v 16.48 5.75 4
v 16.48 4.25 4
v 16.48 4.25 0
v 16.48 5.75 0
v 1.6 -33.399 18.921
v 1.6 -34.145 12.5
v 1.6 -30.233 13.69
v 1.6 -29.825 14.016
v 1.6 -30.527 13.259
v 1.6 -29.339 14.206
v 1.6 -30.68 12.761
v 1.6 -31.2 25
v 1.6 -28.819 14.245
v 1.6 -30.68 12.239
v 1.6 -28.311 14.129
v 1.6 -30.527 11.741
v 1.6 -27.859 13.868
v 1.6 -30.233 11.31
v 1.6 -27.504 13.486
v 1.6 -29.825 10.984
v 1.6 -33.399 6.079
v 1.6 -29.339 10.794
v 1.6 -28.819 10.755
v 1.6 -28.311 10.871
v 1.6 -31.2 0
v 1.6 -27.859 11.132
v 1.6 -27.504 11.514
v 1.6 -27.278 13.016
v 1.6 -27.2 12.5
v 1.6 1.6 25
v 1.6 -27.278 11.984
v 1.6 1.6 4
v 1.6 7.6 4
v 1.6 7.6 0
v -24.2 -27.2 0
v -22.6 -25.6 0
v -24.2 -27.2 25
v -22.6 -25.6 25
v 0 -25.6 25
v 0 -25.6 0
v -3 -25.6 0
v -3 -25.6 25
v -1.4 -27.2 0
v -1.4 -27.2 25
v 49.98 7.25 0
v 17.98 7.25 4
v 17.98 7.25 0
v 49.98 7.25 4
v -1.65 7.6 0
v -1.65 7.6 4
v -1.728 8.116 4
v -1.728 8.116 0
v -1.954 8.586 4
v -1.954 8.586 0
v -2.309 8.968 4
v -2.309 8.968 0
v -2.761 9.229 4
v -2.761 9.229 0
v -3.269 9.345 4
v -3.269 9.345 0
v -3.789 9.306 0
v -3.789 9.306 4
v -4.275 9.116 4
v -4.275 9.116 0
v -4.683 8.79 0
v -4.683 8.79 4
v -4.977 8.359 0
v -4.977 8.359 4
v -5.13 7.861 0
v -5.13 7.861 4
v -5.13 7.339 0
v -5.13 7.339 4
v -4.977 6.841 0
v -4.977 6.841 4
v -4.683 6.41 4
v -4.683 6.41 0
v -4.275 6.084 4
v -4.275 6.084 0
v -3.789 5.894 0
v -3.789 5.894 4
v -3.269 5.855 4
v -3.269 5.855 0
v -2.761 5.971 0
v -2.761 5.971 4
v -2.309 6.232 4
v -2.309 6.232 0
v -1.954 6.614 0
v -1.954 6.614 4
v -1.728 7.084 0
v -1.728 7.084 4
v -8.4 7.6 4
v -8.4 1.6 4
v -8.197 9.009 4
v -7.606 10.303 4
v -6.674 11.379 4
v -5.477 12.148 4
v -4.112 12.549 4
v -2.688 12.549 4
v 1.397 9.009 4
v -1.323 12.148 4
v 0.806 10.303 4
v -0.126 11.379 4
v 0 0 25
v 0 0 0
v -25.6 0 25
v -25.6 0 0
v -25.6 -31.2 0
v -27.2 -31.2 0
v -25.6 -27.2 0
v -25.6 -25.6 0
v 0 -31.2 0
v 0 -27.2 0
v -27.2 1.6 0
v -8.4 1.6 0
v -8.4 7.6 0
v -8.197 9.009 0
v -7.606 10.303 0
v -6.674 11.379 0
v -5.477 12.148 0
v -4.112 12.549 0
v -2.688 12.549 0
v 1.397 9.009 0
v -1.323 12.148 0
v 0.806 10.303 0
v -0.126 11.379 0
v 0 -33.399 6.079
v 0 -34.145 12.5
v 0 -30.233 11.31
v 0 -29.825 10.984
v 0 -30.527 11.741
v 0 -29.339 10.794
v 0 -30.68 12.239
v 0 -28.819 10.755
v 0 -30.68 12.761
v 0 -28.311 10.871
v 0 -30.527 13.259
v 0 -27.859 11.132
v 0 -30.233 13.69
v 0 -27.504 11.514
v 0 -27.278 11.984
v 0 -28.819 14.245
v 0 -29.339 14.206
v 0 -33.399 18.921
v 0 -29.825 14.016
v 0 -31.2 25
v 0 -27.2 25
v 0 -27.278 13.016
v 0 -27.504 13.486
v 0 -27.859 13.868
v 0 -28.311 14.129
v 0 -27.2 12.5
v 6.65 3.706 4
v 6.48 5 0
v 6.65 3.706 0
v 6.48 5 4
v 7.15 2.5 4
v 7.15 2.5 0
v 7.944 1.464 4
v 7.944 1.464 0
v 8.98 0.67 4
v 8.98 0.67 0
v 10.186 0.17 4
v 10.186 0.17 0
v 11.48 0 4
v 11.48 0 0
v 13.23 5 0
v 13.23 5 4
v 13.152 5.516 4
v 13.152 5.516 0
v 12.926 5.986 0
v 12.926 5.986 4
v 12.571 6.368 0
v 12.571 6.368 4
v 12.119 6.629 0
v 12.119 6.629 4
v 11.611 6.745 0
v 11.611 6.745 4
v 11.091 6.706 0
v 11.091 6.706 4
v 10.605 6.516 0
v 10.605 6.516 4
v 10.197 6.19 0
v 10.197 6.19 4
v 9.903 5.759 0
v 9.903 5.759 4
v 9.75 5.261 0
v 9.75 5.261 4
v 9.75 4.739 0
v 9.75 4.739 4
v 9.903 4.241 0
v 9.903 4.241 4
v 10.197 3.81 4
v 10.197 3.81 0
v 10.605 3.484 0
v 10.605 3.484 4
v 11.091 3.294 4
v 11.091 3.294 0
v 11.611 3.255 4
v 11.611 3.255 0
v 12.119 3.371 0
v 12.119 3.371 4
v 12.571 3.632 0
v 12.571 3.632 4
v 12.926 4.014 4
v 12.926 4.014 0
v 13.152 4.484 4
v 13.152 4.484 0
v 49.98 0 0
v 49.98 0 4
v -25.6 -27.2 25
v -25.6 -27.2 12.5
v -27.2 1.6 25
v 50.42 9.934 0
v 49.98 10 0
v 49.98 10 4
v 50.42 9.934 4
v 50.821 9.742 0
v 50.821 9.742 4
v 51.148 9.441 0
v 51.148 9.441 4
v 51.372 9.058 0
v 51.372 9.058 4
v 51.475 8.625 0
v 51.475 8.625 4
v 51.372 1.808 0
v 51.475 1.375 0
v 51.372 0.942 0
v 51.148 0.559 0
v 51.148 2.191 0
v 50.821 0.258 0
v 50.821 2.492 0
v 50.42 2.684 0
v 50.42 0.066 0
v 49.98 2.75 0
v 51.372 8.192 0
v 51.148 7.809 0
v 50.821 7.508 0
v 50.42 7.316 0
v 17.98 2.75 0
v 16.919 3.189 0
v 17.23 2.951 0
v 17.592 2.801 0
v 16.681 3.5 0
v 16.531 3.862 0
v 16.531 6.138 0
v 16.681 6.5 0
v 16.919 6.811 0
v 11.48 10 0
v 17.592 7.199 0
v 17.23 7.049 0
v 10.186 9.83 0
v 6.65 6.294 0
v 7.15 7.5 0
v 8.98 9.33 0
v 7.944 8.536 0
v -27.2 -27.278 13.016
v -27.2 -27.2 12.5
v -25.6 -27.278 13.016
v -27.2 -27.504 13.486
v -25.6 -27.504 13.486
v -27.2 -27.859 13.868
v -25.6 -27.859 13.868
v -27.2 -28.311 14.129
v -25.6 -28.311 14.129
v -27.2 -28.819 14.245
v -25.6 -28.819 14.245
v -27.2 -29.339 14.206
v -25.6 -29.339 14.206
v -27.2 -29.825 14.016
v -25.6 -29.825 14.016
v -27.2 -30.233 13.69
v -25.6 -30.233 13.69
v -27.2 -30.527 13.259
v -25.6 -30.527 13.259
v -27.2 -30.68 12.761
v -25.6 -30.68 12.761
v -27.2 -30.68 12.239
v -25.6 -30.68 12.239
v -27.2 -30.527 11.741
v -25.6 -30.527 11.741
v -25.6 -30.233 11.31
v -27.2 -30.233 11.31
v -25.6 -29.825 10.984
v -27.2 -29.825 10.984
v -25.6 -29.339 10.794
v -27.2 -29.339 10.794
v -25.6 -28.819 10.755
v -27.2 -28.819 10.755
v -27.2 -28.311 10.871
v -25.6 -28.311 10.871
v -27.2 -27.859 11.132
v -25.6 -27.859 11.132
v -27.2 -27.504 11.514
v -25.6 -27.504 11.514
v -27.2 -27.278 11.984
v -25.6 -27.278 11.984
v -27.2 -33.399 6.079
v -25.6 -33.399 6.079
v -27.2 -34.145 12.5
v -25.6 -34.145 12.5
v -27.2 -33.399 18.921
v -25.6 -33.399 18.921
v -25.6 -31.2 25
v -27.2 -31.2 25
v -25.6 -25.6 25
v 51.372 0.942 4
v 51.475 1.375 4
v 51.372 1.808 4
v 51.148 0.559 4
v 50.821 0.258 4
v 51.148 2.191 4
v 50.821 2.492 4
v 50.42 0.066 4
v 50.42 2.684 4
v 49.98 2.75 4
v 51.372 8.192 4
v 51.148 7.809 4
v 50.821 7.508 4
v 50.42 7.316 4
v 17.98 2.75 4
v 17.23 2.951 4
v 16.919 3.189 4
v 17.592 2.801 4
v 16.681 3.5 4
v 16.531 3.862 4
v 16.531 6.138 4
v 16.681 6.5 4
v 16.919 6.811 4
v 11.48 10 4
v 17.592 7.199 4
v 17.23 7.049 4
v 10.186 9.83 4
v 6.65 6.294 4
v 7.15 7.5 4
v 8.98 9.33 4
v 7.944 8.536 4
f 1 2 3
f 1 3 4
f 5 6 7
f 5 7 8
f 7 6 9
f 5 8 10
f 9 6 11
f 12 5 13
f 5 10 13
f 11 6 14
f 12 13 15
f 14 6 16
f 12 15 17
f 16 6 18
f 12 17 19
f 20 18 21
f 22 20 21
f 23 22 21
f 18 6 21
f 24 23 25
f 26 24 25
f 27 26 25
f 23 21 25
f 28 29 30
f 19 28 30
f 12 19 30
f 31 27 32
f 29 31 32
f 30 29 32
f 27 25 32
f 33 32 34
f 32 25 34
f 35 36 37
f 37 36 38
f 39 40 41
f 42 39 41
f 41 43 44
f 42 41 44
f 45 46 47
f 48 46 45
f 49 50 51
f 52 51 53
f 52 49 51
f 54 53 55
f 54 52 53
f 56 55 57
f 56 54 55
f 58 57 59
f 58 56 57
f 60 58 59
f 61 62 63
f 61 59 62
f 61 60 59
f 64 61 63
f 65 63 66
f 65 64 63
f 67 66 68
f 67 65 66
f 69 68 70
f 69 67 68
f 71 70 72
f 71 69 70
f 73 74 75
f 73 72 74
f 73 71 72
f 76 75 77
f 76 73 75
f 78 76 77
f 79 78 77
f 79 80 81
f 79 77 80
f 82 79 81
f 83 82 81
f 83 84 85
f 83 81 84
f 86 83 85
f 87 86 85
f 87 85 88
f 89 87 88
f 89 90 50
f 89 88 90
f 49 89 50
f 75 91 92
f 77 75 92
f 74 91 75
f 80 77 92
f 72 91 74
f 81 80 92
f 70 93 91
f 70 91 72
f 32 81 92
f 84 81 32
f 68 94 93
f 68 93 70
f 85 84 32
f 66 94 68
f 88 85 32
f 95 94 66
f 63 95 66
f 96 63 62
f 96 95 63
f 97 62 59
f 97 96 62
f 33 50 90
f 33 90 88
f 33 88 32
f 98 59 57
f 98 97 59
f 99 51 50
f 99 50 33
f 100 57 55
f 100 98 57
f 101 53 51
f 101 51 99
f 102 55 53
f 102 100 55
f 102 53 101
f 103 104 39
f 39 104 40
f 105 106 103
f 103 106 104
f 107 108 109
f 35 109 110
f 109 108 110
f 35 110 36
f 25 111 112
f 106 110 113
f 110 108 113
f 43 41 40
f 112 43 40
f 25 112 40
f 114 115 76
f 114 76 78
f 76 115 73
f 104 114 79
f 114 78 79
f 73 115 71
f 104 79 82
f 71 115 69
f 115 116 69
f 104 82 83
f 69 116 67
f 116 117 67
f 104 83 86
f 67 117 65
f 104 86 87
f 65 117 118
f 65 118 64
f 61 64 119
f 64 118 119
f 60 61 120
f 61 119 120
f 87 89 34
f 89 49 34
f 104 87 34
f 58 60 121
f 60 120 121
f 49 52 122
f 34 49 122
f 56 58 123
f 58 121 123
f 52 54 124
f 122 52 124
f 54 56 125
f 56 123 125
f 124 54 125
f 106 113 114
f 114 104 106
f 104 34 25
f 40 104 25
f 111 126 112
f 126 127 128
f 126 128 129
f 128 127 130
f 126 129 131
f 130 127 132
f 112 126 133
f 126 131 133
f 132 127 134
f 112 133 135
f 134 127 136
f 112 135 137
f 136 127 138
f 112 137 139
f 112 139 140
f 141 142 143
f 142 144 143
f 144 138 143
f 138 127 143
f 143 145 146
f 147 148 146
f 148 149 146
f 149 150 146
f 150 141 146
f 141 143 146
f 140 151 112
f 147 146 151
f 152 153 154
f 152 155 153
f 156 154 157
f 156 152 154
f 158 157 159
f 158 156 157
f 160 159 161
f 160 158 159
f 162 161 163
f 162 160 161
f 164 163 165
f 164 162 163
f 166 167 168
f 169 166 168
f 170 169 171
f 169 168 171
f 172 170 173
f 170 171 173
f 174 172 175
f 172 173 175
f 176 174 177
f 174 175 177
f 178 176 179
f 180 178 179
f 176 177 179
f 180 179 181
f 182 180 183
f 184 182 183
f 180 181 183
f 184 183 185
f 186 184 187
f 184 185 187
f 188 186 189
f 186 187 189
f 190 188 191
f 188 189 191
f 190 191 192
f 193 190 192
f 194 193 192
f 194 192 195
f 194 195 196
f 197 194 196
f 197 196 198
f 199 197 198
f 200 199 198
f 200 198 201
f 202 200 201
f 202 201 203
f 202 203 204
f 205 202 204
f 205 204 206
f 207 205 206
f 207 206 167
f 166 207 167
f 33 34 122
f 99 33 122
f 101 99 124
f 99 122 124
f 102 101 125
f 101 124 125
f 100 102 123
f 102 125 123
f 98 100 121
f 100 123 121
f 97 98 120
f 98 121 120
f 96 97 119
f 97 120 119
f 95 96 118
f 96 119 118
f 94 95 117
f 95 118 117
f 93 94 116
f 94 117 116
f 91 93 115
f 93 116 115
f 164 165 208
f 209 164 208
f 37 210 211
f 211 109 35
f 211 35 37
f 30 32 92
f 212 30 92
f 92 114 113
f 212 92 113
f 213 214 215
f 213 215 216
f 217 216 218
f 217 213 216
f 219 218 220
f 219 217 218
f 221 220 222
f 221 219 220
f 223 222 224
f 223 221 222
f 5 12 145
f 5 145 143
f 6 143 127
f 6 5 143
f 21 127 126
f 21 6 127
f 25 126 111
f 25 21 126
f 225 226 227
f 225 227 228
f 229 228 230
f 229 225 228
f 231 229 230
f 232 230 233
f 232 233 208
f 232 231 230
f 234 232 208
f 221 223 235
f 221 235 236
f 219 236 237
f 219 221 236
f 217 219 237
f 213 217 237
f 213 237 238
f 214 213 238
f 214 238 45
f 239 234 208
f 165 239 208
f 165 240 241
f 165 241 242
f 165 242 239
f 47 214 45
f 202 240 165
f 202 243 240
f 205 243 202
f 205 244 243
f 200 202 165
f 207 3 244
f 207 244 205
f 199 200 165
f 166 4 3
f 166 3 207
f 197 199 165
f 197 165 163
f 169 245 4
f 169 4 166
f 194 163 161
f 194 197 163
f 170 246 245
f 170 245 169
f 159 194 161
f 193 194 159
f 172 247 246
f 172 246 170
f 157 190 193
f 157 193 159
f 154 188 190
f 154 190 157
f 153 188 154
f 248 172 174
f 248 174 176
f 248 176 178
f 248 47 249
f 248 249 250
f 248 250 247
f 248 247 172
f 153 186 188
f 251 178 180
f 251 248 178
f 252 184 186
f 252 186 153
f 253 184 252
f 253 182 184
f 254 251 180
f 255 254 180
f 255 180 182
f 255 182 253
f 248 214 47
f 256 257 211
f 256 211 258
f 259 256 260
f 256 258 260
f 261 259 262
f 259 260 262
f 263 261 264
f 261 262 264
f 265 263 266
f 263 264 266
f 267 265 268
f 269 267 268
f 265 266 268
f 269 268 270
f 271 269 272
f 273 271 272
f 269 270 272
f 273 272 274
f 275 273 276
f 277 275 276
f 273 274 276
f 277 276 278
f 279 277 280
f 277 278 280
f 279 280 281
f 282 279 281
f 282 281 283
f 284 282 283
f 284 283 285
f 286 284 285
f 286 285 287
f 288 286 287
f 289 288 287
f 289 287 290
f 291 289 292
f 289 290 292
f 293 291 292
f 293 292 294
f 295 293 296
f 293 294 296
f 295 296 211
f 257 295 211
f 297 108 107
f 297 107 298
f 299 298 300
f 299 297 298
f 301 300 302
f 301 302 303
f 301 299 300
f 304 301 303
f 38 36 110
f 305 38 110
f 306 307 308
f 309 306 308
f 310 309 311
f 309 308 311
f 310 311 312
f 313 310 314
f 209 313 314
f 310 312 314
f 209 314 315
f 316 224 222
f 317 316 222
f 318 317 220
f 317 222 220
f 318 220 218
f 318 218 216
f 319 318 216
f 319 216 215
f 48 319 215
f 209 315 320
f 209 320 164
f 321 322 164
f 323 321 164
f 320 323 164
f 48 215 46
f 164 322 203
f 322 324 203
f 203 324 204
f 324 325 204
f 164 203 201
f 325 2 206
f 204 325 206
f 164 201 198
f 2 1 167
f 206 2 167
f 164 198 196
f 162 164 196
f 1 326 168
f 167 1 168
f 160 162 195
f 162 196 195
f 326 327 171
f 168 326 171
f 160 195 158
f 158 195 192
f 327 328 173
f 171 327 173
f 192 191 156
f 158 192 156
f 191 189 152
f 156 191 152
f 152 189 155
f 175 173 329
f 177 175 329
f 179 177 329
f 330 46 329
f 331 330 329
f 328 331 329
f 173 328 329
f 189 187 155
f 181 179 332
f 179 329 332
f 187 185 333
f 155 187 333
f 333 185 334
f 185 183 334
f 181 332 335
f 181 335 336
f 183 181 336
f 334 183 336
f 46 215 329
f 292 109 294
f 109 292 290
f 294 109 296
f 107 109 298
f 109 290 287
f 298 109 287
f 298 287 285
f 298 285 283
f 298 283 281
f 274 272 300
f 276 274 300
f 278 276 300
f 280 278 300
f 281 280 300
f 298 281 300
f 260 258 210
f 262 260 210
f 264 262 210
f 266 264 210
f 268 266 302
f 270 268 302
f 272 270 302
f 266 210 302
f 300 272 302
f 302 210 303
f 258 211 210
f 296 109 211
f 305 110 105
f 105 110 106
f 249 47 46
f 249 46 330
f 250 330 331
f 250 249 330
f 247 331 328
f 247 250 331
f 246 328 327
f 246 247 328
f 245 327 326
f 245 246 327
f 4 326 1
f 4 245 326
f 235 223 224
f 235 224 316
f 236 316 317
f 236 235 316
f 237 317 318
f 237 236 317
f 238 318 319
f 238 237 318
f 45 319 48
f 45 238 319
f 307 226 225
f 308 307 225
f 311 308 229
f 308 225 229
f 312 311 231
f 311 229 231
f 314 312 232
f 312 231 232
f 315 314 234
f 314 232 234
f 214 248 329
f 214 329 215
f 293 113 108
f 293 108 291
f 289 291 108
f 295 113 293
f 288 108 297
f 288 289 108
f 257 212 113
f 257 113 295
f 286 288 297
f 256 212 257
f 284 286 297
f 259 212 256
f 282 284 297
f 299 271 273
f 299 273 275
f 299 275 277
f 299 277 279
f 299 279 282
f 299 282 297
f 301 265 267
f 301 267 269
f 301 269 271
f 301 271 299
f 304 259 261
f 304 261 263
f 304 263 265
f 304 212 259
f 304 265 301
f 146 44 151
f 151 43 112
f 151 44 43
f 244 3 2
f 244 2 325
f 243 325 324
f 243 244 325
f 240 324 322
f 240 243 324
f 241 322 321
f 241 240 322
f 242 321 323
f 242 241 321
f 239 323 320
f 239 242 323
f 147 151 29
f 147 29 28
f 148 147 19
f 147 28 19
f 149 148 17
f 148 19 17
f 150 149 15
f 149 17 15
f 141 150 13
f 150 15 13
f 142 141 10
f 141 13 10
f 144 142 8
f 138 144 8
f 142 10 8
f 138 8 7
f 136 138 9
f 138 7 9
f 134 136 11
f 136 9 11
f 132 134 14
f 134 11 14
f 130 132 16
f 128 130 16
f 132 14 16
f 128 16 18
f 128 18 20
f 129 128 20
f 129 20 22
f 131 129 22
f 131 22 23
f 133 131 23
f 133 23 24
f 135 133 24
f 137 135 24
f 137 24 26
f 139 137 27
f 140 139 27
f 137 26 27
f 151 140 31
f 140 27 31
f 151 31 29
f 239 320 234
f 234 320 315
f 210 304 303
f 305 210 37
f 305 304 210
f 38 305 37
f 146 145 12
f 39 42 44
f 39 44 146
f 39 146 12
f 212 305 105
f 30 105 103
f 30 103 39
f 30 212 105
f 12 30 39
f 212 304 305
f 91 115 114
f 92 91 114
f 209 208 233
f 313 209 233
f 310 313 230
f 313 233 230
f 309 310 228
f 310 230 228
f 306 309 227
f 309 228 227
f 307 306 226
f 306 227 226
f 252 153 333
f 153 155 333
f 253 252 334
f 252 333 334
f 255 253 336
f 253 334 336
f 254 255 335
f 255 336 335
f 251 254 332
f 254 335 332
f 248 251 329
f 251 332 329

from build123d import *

# Parameters (mm, degrees)
F1_DEPTH     = 25
F2_SIZE      = 1.59999
F4_DEPTH     = 1.6
F6_DEPTH     = 1.6
F7_R         = 1.75
F8_DEPTH     = 50
F10_DEPTH    = 4
F11_R        = 1.75
F12_DEPTH    = 25.001
F13_W        = 45
F13_H        = 10
F14_DEPTH    = 4
F15_R        = 4.99999
F16_R        = 1.75
F17_DEPTH    = 4.001
F18_W        = 35
F18_H        = 4.5
F19_DEPTH    = 4.001
F20_T1_DEPTH = 4
F20_T3_DEPTH = 11.5


# Not quite as in the source:
# - a fillet or chamfer that OpenCascade refuses, or shapes differently, is made with other operations: its cross-section is extruded or revolved along the edge and cut away or added
# - a fillet or chamfer is up to 0.001 mm smaller than in the source, because OpenCascade refuses the exact size


with BuildPart() as f1:
    # F0 (on Top) → F1 (new body)
    with BuildSketch(Plane.XY):
        Polygon((-25.6, 0), (0, 0), (0, -25.6), (-3, -25.6), (-3, -27.2), (0, -27.2), (0, -31.2), (1.6, -31.2), (1.6, 1.6), (-27.2, 1.6), (-27.2, -31.2), (-25.6, -31.2), (-25.6, -27.2), (-22.6, -27.2), (-22.6, -25.6), (-25.6, -25.6), align=None)
    extrude(amount=F1_DEPTH)

    # F2 (size 1.6 in the source; OpenCascade refuses exactly that, so slightly less here)
    f2_edges = [f1.edges().sort_by_distance(p)[0] for p in [
        (-22.6, -27.2, 12.5),
        (-3, -27.2, 12.5),
    ]]
    chamfer(f2_edges, length=F2_SIZE)

    # F3 (on face) → F4 (join, through all)
    with BuildSketch(Plane(origin=(-27.2, 0, 0), x_dir=(0, -1, 0), z_dir=(-1, 0, 0))):
        with BuildLine():
            Line((31.2, 25), (31.2, 0))
            ThreePointArc((31.2, 0), (34.1450603673, 12.5), (31.2, 25))
        make_face()
    extrude(amount=-F4_DEPTH)

    # F5 (on face) → F6 (join, through all)
    with BuildSketch(Plane.YZ.offset(1.6)):
        with BuildLine():
            Line((-31.2, 0), (-31.2, 25))
            ThreePointArc((-31.2, 25), (-34.1450603673, 12.5), (-31.2, 0))
        make_face()
    extrude(amount=-F6_DEPTH)

    # F7 (on face) → F8 (cut, symmetric)
    with BuildSketch(Plane.YZ.offset(-25.6)):
        with Locations((-28.95, 12.5)):
            Circle(F7_R)
    extrude(amount=F8_DEPTH, both=True, mode=Mode.SUBTRACT)

    # F9 (on Top) → F10 (join)
    with BuildSketch(Plane.XY):
        with BuildLine():
            ThreePointArc((-8.4, 7.6), (-3.4, 2.6), (1.6, 7.6))
            ThreePointArc((1.6, 7.6), (-3.4, 12.6), (-8.4, 7.6))
        make_face()
        with BuildLine():
            Line((1.6, 1.6), (1.6, 7.6))
            ThreePointArc((1.6, 7.6), (-3.4, 2.6), (-8.4, 7.6))
            Line((-8.4, 7.6), (-8.4, 1.6))
            Line((-8.4, 1.6), (1.6, 1.6))
        make_face()
    extrude(amount=F10_DEPTH)

    # F11 (on Top) → F12 (cut, through all)
    with BuildSketch(Plane.XY):
        with Locations((-3.4, 7.6)):
            Circle(F11_R)
    extrude(amount=F12_DEPTH, mode=Mode.SUBTRACT)


with BuildPart() as f14:
    # F13 (on Top) → F14 (new body)
    with BuildSketch(Plane.XY):
        with Locations((28.9799958316, 5)):
            Rectangle(F13_W, F13_H)
    extrude(amount=F14_DEPTH)

    # F15 (radius 5 in the source; OpenCascade refuses exactly that, so slightly less here)
    f15_edges = [f14.edges().sort_by_distance(p)[0] for p in [
        (6.479996, 0, 2),
        (6.479996, 10, 2),
    ]]
    fillet(f15_edges, radius=F15_R)

    # F16 (on face) → F17 (cut, through all)
    with BuildSketch(Plane.XY.offset(4)):
        with Locations((11.4799958316, 5)):
            Circle(F16_R)
    extrude(amount=-F17_DEPTH, mode=Mode.SUBTRACT)

    # F18 (on face) → F19 (cut, through all)
    with BuildSketch(Plane.XY.offset(4)):
        with Locations((33.9799958316, 5)):
            Rectangle(F18_W, F18_H)
    extrude(amount=-F19_DEPTH, mode=Mode.SUBTRACT)

    # F20: fillet of radius 1.5 on 6 edges, made by hand

    # F20_s2 → F20_t1 (join)
    with BuildSketch(Plane.XY):
        with BuildLine():
            ThreePointArc((17.9799958316, 7.25), (16.9193356598, 6.8106601718), (16.4799958316, 5.75))
            Line((16.4799958316, 5.75), (16.4799958316, 7.25))
            Line((16.4799958316, 7.25), (17.9799958316, 7.25))
        make_face()
        with BuildLine():
            ThreePointArc((16.4799958316, 4.25), (16.9193356598, 3.1893398282), (17.9799958316, 2.75))
            Line((17.9799958316, 2.75), (16.4799958316, 2.75))
            Line((16.4799958316, 2.75), (16.4799958316, 4.25))
        make_face()
    extrude(amount=F20_T1_DEPTH)

    # F20_s4 → F20_t3 (cut)
    with BuildSketch(Plane.XY.offset(-3.75)):
        with BuildLine():
            ThreePointArc((51.4799958316, 8.75), (51.0406560034, 7.6893398282), (49.9799958316, 7.25))
            Line((49.9799958316, 7.25), (51.4799958316, 7.25))
            Line((51.4799958316, 7.25), (51.4799958316, 8.75))
        make_face()
        with BuildLine():
            ThreePointArc((49.9799958316, 10), (51.0406560034, 9.5606601718), (51.4799958316, 8.5))
            Line((51.4799958316, 8.5), (51.4799958316, 10))
            Line((51.4799958316, 10), (49.9799958316, 10))
        make_face()
        with BuildLine():
            ThreePointArc((51.4799958316, 1.25), (51.0406560034, 2.3106601718), (49.9799958316, 2.75))
            Line((49.9799958316, 2.75), (51.4799958316, 2.75))
            Line((51.4799958316, 2.75), (51.4799958316, 1.25))
        make_face()
        with BuildLine():
            ThreePointArc((49.9799958316, 0), (51.0406560034, 0.4393398282), (51.4799958316, 1.5))
            Line((51.4799958316, 1.5), (51.4799958316, 0))
            Line((51.4799958316, 0), (49.9799958316, 0))
        make_face()
    extrude(amount=F20_T3_DEPTH, mode=Mode.SUBTRACT)


solid = Compound([f1.part, f14.part])
